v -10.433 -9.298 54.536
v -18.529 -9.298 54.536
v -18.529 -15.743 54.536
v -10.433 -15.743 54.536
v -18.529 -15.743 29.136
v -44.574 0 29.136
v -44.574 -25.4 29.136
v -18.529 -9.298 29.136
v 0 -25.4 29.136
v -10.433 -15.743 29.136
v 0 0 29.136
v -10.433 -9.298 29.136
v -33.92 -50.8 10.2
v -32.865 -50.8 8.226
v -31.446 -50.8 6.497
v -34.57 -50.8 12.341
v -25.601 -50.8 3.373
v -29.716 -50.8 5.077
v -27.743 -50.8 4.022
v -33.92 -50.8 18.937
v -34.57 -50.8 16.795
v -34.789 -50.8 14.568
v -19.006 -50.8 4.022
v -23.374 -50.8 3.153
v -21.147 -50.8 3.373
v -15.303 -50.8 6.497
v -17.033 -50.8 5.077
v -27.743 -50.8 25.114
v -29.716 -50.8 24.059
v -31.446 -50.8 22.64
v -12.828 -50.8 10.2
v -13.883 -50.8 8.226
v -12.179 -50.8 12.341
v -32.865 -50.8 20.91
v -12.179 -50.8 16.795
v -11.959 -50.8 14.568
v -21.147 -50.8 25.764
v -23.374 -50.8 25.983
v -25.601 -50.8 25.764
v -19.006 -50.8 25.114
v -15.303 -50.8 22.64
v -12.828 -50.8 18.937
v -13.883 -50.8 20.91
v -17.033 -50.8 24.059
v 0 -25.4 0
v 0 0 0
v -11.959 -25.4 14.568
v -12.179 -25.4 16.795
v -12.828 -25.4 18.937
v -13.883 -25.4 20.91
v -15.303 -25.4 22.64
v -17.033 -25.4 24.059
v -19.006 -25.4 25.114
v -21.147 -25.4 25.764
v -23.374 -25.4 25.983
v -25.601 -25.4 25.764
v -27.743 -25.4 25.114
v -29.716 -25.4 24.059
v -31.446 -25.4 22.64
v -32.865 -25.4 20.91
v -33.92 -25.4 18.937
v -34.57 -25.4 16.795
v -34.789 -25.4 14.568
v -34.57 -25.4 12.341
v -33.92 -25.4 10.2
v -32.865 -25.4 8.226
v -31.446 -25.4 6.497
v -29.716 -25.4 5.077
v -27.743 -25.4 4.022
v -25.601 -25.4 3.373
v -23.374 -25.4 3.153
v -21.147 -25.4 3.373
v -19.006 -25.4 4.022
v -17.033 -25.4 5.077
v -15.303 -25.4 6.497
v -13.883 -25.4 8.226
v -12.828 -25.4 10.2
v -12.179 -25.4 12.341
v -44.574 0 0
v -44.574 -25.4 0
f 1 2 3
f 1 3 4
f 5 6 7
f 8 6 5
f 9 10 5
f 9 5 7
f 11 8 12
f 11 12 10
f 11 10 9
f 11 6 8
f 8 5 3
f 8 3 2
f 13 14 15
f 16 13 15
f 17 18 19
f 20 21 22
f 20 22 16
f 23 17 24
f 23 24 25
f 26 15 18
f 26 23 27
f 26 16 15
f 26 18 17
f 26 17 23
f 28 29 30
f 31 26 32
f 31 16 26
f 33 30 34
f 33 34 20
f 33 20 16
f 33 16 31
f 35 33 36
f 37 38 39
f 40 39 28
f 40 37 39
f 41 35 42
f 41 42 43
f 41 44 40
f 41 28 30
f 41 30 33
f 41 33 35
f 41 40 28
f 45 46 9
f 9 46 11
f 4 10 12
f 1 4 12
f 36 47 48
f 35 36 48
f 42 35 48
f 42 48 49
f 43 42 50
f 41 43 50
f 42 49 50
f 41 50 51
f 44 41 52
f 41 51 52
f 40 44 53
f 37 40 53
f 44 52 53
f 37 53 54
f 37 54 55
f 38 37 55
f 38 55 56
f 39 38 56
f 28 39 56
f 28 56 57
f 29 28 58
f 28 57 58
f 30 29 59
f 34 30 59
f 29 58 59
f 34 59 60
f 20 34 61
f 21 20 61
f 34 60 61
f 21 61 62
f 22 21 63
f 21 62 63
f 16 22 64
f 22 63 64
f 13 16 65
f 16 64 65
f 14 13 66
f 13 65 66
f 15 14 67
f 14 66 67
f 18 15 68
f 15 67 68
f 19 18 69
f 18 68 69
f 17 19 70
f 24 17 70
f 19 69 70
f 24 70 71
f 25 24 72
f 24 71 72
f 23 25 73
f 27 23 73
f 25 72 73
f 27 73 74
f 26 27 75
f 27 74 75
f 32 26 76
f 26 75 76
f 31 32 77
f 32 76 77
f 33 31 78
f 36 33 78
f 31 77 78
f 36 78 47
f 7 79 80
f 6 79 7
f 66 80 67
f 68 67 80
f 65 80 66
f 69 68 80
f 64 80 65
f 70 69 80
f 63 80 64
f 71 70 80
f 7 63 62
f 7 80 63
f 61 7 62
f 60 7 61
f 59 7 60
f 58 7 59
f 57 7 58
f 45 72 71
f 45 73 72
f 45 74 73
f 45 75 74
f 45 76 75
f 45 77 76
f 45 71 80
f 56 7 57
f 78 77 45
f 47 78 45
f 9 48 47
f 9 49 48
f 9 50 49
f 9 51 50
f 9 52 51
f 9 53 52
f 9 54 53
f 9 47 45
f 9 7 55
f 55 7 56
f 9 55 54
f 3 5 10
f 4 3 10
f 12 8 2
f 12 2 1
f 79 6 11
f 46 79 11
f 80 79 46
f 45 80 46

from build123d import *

# Parameters (mm, degrees)
F0_W     = 44.574387
F0_H     = 29.136432
F1_DEPTH = 25.4
F2_W     = 8.096363
F2_H     = 6.445411
F3_DEPTH = 25.4
F4_R     = 11.414874
F5_DEPTH = 25.4


with BuildPart() as f1:
    # F0 (on Front) → F1 (new body)
    with BuildSketch(Plane.XZ):
        with Locations((-22.287194, 14.568216)):
            Rectangle(F0_W, F0_H)
    extrude(amount=F1_DEPTH)

    # F2 (on face) → F3 (join)
    with BuildSketch(Plane.XY.offset(29.136432)):
        with Locations((-14.480712, -12.520231)):
            Rectangle(F2_W, F2_H)
    extrude(amount=F3_DEPTH)

    # F4 (on face) → F5 (join)
    with BuildSketch(Plane.XZ.offset(25.4)):
        with Locations((-23.374369, 14.568217)):
            Circle(F4_R)
    extrude(amount=F5_DEPTH)


solid = f1.part
